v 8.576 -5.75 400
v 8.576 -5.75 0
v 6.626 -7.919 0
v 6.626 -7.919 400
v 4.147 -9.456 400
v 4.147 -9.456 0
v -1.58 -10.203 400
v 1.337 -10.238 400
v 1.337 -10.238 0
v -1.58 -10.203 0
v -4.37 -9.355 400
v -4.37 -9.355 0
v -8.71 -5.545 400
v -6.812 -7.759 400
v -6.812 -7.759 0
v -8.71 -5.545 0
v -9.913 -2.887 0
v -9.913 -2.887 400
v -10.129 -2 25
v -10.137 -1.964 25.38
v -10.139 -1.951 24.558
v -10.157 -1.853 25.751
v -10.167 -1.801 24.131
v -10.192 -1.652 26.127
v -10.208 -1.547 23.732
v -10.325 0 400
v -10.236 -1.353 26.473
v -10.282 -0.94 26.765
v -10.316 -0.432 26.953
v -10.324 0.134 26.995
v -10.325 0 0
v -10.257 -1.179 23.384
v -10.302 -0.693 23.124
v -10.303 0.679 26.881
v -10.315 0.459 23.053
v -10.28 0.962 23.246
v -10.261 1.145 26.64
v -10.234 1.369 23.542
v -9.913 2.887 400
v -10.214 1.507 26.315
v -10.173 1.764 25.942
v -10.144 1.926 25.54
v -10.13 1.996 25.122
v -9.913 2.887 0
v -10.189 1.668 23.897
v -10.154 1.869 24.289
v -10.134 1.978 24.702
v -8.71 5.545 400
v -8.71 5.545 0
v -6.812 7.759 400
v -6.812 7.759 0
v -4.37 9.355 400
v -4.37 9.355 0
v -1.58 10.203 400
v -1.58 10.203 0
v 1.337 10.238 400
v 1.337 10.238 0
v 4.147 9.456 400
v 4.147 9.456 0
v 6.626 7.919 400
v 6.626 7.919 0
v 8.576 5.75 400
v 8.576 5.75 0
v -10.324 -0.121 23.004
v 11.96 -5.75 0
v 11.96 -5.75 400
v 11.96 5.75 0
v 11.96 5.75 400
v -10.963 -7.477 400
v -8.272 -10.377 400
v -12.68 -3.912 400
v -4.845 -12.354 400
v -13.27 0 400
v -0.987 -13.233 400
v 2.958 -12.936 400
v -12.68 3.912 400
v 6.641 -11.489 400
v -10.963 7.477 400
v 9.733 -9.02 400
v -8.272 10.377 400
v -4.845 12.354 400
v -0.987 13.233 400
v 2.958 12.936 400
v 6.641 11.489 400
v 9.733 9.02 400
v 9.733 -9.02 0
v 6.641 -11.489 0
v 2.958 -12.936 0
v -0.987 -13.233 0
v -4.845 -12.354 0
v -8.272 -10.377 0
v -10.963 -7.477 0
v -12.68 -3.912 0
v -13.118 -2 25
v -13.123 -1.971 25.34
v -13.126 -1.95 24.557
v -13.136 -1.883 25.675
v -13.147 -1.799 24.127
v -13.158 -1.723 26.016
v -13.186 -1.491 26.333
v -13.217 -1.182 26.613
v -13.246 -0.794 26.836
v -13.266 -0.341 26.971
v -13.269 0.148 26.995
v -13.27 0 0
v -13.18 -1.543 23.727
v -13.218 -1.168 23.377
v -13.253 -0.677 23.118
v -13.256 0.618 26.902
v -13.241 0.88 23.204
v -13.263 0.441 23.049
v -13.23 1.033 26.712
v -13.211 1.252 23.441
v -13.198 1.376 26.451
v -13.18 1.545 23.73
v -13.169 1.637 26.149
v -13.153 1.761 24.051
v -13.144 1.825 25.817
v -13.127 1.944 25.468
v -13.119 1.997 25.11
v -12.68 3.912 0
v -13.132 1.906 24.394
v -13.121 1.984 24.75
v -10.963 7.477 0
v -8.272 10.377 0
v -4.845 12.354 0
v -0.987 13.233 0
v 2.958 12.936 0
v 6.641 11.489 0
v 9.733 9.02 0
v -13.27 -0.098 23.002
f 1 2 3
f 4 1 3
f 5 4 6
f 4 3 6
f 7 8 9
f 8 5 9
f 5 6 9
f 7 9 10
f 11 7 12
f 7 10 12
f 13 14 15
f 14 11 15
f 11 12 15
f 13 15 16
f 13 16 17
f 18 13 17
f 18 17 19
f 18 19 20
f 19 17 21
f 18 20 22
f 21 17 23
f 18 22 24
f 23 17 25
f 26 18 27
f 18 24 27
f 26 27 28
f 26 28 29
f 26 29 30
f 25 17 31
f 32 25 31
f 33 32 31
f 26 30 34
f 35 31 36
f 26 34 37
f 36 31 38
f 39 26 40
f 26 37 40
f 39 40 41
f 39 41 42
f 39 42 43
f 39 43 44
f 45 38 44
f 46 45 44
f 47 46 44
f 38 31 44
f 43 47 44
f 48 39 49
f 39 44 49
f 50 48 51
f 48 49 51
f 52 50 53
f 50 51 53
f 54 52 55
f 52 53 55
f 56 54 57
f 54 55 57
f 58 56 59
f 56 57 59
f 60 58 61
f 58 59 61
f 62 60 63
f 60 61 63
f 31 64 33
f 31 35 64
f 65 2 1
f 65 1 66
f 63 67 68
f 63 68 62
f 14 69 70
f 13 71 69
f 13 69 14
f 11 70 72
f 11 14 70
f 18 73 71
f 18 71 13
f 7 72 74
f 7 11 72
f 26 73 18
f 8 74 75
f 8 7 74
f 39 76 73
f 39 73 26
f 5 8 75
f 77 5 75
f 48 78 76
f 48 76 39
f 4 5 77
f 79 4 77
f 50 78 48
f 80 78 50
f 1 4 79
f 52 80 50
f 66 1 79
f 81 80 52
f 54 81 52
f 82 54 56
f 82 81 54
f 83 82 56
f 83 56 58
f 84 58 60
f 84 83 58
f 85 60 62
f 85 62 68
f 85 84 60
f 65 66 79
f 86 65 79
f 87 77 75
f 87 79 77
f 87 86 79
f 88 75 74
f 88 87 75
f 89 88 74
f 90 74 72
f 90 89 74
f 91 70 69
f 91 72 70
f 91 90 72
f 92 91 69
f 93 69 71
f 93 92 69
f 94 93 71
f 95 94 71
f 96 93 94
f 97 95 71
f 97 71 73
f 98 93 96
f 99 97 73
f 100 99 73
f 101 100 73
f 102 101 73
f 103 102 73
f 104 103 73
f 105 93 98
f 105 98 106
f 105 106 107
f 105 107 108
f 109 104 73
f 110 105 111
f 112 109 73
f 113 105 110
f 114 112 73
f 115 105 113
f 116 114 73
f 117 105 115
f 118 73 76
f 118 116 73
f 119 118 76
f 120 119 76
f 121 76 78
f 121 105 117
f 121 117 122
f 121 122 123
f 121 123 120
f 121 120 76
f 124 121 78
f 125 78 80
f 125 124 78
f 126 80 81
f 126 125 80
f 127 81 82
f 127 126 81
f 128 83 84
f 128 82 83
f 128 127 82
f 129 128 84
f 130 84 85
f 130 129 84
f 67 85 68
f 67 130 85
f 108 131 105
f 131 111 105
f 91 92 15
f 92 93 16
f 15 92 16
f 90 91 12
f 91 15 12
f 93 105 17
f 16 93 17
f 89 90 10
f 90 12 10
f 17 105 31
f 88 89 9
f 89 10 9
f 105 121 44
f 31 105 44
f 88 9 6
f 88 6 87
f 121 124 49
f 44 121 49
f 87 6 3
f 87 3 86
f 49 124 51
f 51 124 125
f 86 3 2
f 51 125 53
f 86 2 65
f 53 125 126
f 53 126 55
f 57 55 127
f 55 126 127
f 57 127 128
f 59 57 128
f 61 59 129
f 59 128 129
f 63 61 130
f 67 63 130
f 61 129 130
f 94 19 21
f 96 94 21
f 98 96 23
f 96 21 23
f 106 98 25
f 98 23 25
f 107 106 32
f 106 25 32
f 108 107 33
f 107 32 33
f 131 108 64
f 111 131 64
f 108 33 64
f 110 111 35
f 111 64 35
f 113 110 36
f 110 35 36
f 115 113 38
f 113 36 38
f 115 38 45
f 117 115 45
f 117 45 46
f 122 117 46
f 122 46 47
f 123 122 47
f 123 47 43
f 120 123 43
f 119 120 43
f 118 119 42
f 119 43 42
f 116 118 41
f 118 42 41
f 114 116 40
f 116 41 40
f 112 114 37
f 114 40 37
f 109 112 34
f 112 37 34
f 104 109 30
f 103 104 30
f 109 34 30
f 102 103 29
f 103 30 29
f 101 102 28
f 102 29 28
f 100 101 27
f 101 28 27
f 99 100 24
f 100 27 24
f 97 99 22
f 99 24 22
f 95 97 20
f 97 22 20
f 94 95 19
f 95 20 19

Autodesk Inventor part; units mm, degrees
ref_plane "YZ Plane" through (0, 0, 0) normal (1, 0, 0) x (0, 1, 0)
ref_plane "XZ Plane" through (0, 0, 0) normal (0, 1, 0) x (-1, 0, 0)
sketch "Sketch1" plane through (0, 0, 0) normal (0, 0, 1) x (1, 0, 0)
  circle A0 centre (0, 0) radius 13.27
  circle A1 centre (0, 0) radius 10.325
  dimension "d0" = 26.54
  dimension "d1" = 20.65
extrude "Extrusion1" add sketch "Sketch1" along normal blind 400
sketch "Sketch6" plane through (0, 0, 400) normal (0, 0, 1) x (1, 0, 0)
  line L0 (0, -5.75) -> (20, -5.75)
  line L1 (20, -5.75) -> (20, 5.75)
  line L2 (20, 5.75) -> (0, 5.75)
  line L3 (0, 5.75) -> (0, -5.75)
  point P0 (0, 0)
  point P1 (0, 0)
  dimension "d13" = 20
  dimension "d14" = 11.5
extrude "Extrusion5" cut sketch "Sketch6" against normal up to next
ref_plane "Work Plane2" through (11.9595, 5.75, 400) normal (1, 0, 0) x (0, -1, 0)
sketch "Sketch7" plane through (11.9595, 5.75, 400) normal (1, 0, 0) x (0, -1, 0)
  circle A0 centre (5.75, 375) radius 2
  line L0 (16.075, 0) -> (-4.575, 0) projected
  line L1 (-4.575, 400) -> (16.075, 400) projected
  point P0 (5.75, 400)
  point P1 (11.5, 0)
  point P2 (0, 0)
  point P3 (0, 400)
  point P4 (11.5, 400)
  dimension "d17" = 4
  dimension "d21" = 25
extrude "Extrusion6" cut sketch "Sketch7" against normal through all
properties part number "inner_sheath" material "Acetal Resin, White"
